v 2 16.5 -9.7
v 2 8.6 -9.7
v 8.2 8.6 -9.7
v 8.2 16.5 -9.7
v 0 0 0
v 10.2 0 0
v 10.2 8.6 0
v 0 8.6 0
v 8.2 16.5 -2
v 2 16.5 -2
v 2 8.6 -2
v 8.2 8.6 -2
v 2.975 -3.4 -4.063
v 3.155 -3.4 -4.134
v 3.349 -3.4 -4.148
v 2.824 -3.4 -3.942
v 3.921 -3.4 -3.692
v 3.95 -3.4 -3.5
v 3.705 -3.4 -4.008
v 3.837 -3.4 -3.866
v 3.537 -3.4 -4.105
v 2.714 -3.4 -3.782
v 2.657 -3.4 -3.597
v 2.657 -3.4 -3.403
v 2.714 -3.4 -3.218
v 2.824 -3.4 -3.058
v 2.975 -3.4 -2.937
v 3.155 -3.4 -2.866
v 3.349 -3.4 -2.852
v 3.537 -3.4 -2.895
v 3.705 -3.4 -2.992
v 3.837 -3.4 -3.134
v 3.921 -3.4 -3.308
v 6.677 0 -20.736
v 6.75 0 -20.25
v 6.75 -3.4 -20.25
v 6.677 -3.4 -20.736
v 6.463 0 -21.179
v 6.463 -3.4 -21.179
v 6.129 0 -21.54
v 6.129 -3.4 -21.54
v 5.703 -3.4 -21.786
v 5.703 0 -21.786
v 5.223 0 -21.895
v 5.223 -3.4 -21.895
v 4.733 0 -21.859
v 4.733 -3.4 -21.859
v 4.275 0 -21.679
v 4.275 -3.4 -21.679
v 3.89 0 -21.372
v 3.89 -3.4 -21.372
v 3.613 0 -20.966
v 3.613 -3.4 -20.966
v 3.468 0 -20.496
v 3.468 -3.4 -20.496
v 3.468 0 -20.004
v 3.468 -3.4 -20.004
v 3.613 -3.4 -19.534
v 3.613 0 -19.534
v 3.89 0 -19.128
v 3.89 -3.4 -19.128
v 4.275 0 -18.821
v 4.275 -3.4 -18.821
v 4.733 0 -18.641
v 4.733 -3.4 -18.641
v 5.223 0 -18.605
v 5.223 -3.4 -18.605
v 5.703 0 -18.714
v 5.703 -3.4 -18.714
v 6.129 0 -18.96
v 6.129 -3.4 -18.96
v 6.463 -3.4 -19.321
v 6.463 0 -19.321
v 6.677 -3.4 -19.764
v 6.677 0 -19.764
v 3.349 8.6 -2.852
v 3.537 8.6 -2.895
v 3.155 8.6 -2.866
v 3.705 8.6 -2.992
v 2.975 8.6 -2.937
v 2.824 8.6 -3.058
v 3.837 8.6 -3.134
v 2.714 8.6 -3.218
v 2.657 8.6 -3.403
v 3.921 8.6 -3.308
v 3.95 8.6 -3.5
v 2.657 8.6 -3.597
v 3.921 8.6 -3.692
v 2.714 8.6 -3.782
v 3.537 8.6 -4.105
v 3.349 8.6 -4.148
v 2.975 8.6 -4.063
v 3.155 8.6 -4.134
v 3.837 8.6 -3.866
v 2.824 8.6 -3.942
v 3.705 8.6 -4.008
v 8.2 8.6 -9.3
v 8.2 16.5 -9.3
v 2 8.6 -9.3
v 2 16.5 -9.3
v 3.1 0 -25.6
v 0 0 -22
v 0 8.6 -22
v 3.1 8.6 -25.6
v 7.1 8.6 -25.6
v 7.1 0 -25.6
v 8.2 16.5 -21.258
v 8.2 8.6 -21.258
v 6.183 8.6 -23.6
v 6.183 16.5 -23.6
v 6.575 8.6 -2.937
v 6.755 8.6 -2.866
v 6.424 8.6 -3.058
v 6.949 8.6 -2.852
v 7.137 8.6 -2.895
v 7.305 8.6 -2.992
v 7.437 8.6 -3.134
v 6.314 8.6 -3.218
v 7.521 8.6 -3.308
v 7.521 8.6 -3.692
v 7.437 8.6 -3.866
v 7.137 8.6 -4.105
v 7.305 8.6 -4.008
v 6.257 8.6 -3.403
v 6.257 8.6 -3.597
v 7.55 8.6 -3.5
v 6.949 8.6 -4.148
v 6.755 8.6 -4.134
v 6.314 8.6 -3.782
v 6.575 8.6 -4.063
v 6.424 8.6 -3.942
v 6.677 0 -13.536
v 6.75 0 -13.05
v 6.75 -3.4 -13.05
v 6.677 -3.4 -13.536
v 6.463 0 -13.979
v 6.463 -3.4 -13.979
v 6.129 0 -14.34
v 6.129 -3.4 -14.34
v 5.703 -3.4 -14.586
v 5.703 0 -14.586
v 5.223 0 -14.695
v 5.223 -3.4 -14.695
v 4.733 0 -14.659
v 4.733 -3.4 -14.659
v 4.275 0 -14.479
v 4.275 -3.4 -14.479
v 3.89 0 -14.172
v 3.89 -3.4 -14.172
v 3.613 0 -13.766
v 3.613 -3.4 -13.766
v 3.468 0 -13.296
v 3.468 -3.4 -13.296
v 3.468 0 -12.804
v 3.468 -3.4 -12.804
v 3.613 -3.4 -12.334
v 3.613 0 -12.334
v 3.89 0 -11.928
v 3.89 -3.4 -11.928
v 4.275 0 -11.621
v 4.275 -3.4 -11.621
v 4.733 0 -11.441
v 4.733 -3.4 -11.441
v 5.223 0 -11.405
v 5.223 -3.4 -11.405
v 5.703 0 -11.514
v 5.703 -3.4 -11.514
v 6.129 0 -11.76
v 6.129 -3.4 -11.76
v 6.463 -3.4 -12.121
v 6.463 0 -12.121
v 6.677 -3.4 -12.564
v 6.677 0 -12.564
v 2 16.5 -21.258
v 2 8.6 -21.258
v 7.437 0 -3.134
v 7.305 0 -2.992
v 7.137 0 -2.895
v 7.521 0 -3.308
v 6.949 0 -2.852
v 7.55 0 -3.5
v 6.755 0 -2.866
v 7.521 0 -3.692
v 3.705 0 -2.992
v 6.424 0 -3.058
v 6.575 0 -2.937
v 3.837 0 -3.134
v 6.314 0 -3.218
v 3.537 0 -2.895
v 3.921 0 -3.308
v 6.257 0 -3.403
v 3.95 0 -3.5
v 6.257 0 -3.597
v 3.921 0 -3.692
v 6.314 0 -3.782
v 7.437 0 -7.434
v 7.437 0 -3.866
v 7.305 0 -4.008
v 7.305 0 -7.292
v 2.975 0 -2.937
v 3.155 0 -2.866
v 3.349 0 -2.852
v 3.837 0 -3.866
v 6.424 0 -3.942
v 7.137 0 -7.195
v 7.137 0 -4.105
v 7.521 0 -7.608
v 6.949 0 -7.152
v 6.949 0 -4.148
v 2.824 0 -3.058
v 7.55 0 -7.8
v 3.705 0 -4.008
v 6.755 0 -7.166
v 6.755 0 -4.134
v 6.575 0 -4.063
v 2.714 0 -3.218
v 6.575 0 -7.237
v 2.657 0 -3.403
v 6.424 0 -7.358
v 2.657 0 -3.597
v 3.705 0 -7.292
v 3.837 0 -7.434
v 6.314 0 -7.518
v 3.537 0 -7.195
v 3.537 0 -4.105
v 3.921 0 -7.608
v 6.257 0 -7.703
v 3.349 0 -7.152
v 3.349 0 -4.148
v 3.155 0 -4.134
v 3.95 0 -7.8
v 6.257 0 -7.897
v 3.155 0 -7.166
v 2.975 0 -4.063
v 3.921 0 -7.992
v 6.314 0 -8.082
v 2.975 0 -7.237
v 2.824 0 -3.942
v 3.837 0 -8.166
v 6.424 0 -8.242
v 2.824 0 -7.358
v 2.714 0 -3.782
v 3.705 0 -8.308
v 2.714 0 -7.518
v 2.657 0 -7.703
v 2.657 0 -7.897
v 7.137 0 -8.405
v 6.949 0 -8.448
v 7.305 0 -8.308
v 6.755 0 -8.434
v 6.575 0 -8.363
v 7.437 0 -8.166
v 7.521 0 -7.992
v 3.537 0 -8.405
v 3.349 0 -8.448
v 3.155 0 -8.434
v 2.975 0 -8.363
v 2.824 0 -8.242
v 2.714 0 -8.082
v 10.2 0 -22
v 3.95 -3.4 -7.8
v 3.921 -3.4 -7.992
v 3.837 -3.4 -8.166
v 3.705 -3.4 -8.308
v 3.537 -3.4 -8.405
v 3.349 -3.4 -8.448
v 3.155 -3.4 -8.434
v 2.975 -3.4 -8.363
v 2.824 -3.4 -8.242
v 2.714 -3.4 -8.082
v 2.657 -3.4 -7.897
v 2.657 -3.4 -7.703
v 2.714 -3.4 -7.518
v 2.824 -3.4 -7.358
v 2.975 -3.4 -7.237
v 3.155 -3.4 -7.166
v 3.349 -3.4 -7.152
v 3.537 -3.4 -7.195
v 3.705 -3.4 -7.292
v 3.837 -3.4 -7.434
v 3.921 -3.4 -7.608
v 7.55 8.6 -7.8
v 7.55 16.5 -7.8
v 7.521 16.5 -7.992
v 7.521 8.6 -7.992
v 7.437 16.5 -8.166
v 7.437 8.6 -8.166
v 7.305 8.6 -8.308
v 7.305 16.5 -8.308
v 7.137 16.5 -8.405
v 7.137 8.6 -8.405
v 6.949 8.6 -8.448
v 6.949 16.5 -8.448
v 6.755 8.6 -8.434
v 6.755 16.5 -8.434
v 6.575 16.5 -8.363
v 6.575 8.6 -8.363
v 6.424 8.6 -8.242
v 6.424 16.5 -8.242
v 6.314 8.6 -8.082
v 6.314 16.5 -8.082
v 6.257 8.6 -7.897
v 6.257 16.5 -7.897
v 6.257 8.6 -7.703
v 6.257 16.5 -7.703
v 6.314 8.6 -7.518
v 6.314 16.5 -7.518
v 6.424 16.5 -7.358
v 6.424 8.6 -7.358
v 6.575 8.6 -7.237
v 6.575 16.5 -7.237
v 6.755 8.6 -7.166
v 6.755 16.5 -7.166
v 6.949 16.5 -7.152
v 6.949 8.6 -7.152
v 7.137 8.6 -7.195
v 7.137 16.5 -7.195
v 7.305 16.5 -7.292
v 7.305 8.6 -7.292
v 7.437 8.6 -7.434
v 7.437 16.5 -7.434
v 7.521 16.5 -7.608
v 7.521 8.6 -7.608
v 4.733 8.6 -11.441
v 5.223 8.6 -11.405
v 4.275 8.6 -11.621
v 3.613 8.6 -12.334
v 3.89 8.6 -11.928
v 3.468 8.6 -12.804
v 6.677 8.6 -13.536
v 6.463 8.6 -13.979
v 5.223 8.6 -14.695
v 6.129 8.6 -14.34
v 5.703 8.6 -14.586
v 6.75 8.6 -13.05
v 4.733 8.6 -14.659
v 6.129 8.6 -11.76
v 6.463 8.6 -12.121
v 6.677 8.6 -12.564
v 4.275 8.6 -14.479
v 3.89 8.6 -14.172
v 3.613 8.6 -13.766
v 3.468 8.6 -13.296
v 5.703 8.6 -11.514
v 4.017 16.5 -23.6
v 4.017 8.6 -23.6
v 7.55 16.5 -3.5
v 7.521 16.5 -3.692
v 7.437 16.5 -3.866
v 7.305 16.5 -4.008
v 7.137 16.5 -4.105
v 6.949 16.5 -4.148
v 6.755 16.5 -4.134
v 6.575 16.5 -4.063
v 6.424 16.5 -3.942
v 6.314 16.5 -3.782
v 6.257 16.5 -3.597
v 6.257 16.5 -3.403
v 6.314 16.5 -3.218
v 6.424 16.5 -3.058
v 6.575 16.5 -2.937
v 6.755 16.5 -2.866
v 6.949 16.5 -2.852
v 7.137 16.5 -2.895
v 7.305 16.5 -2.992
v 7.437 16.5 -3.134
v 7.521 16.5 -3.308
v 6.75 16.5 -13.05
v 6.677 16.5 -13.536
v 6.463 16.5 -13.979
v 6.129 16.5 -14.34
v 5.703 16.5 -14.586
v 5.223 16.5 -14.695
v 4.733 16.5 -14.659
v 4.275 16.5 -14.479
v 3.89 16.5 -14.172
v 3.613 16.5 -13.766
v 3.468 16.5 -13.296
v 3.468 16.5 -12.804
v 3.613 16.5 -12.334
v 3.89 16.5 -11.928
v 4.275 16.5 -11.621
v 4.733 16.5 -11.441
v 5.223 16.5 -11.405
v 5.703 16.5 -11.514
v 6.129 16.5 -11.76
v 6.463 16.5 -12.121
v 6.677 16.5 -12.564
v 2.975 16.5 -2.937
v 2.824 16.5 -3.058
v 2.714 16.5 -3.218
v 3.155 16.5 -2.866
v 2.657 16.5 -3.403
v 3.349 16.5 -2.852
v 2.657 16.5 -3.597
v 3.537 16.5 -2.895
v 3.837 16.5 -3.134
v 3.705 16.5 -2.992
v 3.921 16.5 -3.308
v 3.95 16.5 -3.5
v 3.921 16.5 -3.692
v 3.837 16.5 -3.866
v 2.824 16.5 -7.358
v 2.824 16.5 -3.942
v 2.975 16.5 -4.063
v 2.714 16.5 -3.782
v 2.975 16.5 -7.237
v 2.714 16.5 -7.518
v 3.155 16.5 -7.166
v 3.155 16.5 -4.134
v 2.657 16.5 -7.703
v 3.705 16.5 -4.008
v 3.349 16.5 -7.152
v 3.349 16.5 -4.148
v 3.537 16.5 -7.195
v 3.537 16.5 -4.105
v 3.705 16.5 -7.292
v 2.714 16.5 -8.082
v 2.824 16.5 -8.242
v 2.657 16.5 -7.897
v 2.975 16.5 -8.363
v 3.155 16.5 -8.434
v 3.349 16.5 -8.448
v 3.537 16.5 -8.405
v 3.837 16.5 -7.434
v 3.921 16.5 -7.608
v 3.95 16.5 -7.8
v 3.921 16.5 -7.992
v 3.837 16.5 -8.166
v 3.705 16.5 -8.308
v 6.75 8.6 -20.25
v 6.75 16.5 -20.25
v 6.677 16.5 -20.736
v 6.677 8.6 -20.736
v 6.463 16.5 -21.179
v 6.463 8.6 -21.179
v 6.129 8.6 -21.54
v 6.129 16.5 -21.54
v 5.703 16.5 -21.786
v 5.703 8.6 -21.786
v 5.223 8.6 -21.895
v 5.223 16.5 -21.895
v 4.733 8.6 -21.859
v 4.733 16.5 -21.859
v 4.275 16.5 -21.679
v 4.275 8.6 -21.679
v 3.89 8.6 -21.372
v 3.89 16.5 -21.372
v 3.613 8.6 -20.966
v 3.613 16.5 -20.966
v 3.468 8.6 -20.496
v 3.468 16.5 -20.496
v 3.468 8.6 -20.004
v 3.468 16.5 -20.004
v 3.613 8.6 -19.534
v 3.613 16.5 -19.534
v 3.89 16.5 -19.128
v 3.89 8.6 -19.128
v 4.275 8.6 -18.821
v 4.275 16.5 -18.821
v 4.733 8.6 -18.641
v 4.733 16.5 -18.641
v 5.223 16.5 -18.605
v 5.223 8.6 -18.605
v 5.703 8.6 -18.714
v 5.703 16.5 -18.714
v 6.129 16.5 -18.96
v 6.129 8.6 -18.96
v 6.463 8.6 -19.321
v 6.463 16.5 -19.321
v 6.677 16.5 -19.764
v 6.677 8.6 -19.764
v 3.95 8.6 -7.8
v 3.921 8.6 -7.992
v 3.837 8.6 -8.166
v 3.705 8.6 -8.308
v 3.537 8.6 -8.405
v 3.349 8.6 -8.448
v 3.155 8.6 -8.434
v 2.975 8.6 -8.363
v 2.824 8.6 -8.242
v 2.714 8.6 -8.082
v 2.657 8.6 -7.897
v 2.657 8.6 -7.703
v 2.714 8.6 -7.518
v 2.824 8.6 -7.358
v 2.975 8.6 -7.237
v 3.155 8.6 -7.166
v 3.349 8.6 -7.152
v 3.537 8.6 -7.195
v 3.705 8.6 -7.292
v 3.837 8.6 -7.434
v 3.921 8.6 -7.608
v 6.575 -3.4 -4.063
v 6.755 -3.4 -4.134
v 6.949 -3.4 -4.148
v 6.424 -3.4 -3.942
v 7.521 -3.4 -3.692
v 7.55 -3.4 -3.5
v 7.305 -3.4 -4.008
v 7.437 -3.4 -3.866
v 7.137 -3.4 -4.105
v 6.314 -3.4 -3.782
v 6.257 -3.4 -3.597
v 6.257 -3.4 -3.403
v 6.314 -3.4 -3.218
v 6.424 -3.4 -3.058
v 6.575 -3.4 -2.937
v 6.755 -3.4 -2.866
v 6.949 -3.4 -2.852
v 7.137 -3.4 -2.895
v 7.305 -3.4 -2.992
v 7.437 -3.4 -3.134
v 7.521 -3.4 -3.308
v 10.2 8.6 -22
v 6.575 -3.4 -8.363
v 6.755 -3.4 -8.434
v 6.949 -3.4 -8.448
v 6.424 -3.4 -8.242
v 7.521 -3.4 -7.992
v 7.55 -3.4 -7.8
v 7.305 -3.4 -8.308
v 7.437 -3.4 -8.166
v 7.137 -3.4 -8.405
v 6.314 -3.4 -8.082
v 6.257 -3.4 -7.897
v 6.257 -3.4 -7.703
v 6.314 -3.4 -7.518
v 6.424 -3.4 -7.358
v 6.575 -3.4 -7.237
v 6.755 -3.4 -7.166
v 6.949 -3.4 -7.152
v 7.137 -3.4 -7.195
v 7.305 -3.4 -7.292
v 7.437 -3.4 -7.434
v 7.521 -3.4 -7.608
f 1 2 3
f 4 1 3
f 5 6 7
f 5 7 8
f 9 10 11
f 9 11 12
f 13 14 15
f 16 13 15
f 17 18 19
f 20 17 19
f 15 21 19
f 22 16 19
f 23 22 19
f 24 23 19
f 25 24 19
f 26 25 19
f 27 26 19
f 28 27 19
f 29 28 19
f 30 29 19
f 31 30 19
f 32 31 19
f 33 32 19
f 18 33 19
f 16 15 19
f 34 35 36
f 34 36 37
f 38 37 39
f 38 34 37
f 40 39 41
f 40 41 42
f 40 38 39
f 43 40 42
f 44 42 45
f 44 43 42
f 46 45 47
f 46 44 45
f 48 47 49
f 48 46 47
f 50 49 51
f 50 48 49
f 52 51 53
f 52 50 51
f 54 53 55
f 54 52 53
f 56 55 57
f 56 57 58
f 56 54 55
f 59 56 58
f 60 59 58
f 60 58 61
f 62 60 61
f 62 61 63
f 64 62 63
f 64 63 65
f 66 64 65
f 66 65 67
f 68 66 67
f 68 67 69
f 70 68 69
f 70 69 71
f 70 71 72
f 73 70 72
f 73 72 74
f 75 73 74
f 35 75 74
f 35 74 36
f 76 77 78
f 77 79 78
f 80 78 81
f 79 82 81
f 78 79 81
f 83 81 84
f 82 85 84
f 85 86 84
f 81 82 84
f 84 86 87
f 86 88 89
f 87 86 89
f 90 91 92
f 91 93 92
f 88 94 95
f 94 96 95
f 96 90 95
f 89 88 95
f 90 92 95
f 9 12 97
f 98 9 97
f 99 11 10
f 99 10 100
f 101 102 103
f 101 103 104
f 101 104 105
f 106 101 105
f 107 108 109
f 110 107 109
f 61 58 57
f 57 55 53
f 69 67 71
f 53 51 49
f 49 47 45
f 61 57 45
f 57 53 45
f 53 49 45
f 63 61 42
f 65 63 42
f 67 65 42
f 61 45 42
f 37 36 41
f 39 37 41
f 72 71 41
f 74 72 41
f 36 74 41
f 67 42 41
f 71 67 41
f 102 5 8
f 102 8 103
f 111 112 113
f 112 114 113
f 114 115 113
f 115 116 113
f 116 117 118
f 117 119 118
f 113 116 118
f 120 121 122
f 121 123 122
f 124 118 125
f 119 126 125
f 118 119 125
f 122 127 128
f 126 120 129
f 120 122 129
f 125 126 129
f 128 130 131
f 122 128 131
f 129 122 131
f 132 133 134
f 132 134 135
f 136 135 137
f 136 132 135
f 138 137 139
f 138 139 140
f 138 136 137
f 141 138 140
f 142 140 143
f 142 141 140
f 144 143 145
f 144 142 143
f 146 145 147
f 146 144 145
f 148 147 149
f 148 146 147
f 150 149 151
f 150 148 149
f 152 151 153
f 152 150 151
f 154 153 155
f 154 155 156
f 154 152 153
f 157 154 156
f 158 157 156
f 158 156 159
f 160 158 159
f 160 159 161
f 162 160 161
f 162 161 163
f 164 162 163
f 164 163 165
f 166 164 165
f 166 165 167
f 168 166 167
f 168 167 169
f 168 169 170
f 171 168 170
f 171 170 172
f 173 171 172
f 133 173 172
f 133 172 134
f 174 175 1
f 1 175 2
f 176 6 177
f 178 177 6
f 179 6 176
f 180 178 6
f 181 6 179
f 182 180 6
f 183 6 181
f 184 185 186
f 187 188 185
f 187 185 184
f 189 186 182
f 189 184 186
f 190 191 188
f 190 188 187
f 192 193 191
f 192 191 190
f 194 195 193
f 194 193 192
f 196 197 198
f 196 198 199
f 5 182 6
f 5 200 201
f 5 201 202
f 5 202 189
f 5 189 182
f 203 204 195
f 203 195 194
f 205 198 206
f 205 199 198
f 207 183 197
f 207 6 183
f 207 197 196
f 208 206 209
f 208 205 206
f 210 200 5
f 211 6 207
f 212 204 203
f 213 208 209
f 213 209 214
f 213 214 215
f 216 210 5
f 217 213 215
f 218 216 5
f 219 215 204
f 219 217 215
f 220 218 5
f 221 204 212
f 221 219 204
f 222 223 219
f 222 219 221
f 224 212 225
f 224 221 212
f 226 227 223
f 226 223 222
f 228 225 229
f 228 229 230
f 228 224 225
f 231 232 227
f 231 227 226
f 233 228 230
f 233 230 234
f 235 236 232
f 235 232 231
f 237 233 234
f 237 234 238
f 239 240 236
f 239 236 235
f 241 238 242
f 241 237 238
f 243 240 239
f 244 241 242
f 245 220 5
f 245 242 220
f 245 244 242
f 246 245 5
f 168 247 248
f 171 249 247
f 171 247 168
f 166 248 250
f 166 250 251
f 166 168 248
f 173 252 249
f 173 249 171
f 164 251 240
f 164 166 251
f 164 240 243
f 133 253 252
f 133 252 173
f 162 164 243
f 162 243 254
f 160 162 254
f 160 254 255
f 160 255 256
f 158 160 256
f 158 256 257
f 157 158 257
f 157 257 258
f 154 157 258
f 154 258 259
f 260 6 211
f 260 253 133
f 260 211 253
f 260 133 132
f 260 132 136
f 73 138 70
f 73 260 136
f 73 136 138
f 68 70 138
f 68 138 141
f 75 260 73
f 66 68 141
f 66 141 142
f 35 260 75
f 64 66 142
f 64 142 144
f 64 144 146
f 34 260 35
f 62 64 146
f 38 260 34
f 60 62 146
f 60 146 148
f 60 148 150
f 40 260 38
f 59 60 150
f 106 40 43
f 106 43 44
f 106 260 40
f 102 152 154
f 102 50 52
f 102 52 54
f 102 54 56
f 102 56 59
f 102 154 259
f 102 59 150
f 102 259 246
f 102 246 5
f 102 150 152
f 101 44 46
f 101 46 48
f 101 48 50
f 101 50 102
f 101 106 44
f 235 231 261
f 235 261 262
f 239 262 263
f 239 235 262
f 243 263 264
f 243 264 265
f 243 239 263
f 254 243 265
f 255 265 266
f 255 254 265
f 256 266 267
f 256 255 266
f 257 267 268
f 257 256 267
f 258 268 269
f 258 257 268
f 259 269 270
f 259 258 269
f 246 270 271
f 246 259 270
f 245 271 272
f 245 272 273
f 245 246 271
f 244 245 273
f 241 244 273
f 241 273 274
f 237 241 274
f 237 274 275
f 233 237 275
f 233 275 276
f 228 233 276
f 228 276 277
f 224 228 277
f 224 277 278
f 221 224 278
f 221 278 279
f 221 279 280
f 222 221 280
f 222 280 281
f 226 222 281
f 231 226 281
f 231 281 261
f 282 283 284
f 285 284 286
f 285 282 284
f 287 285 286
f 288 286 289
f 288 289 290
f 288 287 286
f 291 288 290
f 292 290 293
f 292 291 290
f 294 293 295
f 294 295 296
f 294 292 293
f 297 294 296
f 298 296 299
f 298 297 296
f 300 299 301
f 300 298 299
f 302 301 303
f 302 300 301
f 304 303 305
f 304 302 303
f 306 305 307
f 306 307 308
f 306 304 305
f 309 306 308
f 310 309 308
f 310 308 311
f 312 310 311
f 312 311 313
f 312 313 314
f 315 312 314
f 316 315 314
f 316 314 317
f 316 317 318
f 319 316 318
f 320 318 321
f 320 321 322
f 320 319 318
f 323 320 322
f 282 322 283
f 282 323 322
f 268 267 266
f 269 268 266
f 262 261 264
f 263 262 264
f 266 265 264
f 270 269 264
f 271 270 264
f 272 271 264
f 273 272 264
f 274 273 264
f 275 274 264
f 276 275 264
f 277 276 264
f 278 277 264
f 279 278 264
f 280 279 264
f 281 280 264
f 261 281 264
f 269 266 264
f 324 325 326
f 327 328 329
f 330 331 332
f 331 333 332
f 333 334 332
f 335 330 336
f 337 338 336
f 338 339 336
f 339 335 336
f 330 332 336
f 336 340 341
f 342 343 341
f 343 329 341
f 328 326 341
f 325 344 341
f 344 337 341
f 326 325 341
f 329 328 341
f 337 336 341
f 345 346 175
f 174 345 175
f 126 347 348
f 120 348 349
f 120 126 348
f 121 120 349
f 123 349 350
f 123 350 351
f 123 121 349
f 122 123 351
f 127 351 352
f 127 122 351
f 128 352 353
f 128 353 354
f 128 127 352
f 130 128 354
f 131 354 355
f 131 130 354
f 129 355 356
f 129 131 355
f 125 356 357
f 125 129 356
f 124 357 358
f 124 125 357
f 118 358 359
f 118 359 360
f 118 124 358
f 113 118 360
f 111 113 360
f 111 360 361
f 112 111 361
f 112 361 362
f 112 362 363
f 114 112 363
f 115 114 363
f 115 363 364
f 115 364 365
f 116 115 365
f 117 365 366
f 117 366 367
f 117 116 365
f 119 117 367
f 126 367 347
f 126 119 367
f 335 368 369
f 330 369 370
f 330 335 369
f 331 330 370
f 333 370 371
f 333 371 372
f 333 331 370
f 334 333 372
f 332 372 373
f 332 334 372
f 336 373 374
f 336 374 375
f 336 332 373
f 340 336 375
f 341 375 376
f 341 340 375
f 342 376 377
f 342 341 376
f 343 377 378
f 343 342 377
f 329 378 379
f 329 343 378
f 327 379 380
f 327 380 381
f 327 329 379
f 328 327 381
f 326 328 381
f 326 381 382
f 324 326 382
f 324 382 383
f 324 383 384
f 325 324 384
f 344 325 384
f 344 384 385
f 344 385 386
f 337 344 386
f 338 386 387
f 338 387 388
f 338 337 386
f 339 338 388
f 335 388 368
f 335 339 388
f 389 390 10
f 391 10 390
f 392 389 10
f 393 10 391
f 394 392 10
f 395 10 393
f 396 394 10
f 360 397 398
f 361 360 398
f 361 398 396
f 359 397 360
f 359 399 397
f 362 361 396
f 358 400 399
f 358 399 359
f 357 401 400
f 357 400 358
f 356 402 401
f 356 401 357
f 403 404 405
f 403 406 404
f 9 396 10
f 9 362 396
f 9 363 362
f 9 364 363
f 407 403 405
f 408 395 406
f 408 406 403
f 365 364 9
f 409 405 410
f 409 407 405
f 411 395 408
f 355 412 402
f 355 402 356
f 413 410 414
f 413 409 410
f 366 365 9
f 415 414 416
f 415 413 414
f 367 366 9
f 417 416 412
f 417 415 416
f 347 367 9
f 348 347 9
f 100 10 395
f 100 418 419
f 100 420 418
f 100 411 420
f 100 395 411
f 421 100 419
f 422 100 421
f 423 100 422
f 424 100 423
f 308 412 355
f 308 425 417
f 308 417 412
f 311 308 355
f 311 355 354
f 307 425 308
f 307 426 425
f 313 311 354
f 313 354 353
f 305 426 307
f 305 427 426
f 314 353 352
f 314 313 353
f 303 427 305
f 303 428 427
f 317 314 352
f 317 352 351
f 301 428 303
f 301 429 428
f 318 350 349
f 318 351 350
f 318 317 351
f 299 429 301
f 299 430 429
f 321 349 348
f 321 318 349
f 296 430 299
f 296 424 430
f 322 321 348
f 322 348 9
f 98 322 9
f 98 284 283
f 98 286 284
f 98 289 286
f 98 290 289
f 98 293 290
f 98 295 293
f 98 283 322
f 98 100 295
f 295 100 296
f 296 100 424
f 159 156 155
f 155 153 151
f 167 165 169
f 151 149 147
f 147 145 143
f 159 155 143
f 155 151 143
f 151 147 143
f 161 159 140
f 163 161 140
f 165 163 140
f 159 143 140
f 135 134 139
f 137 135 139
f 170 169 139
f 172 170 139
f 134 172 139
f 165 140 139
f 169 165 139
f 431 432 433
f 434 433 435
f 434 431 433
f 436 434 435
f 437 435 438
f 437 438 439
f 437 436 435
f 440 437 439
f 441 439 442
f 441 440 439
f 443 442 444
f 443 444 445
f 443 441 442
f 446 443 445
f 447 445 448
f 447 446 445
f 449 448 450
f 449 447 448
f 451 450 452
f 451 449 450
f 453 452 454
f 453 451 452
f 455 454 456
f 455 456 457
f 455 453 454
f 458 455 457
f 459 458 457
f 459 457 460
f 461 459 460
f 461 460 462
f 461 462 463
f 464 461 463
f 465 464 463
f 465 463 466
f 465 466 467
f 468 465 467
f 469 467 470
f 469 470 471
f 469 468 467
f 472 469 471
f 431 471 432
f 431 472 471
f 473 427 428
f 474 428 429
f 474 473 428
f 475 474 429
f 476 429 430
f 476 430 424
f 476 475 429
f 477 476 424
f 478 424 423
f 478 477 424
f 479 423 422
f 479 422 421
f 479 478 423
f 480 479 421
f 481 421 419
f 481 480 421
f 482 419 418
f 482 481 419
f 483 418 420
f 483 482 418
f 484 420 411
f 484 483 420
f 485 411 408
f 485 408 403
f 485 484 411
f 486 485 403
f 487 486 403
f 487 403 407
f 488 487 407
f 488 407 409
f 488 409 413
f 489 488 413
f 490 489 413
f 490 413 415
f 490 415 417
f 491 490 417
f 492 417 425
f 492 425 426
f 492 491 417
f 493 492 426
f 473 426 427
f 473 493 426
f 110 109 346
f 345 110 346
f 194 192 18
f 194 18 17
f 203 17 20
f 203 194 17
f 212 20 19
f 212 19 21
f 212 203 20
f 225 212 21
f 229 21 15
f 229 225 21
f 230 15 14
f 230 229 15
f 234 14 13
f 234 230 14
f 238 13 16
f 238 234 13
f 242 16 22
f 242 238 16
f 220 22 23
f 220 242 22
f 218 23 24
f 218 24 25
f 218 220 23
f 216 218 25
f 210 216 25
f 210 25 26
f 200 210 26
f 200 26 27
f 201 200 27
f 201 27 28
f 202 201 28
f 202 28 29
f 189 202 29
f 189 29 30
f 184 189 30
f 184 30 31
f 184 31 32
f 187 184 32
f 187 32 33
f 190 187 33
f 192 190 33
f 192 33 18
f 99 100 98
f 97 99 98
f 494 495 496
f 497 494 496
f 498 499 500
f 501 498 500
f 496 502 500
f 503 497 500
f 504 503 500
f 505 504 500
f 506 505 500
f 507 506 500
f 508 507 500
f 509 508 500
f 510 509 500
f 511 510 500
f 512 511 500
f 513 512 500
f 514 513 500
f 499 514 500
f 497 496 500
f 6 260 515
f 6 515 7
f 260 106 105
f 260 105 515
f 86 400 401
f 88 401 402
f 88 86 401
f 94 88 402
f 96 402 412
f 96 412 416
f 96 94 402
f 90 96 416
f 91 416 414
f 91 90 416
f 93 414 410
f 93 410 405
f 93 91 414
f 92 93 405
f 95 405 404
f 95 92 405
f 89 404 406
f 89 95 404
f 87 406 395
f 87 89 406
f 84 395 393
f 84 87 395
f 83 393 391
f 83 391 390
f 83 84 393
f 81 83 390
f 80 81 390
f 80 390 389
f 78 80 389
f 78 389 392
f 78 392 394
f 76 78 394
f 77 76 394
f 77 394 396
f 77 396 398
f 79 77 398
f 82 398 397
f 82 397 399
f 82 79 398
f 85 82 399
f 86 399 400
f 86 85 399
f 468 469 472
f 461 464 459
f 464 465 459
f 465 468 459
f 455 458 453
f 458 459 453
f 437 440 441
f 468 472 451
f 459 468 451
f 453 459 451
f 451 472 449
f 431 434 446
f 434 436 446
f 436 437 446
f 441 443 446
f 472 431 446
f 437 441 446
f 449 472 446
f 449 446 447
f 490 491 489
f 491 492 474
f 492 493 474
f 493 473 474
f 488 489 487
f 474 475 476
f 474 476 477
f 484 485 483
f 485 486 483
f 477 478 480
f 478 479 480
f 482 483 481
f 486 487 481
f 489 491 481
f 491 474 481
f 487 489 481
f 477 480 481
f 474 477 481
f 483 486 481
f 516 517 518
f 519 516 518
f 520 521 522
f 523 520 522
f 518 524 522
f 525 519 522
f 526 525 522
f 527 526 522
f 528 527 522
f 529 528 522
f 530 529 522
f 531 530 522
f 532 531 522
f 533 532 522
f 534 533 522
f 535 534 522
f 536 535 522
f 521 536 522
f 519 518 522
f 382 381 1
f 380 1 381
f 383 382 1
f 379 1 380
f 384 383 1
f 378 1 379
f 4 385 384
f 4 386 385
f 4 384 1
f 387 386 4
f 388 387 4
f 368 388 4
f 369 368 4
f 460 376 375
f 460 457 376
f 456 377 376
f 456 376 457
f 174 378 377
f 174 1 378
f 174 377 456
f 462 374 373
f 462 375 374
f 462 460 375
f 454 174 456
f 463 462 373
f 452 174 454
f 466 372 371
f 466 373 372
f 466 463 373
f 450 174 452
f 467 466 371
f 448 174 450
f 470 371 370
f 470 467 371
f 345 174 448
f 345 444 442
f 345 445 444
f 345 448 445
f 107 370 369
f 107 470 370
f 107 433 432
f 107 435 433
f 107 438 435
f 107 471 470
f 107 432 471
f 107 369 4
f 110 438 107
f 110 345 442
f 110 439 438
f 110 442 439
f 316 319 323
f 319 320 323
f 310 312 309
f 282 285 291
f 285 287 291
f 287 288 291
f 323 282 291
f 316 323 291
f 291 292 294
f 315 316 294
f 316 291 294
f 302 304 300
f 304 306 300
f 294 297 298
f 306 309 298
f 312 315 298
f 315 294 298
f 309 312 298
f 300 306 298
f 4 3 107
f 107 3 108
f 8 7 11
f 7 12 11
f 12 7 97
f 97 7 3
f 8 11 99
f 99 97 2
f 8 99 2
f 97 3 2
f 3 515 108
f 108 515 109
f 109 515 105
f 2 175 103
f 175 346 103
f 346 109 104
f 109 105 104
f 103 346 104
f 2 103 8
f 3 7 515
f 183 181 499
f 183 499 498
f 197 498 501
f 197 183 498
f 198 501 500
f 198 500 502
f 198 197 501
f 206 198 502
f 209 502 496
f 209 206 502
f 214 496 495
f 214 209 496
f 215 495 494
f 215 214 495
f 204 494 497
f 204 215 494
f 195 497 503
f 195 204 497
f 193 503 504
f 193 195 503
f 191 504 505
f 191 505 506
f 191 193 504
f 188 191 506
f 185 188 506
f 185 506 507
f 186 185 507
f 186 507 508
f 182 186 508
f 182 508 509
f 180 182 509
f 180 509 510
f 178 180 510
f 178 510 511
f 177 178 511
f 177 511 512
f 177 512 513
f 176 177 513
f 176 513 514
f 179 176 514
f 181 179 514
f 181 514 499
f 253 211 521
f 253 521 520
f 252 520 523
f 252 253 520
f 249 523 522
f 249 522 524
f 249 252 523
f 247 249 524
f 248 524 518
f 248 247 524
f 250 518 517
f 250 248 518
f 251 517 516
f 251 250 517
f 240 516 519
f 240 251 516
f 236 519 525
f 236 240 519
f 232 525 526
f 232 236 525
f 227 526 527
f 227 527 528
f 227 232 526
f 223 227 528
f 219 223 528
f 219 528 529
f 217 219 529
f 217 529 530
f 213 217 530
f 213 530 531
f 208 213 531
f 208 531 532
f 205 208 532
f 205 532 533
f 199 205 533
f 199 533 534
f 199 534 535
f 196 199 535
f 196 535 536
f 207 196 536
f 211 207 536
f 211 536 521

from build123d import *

# Parameters (mm, degrees)
EXTRUDE_1_DEPTH = 8.6
SKETCH_2_R      = 1.65
SKETCH_2_W      = 6.2
SKETCH_2_H      = 7.3
SKETCH_2_R_2    = 0.65
EXTRUDE_2_DEPTH = 7.9
SKETCH_3_R      = 1.65
SKETCH_3_R_2    = 0.65
EXTRUDE_3_DEPTH = 12


with BuildPart() as part:
    # 草图1 → 凸台-拉伸1 (new body)
    with BuildSketch(Plane(origin=(0, 0, 0), x_dir=(1, 0, 0), z_dir=(0, 1, 0))):
        Polygon((0, 0), (0, 22), (3.1, 25.6), (7.1, 25.6), (10.2, 22), (10.2, 0), align=None)
    extrude(amount=EXTRUDE_1_DEPTH)

    # 草图2 → 凸台-拉伸2 (add)
    with BuildSketch(Plane(origin=(0, 8.6, 0), x_dir=(1, 0, 0), z_dir=(0, 1, 0))):
        Polygon((2, 9.7), (8.2, 9.7), (8.2, 21.257555221), (6.182894773, 23.6), (4.017105227, 23.6), (2, 21.257555221), align=None)
        with Locations((5.1, 20.25)):
            Circle(SKETCH_2_R, mode=Mode.SUBTRACT)
        with Locations((5.1, 13.05)):
            Circle(SKETCH_2_R, mode=Mode.SUBTRACT)
        with Locations((5.1, 5.65)):
            Rectangle(SKETCH_2_W, SKETCH_2_H)
        with Locations((3.3, 7.8)):
            Circle(SKETCH_2_R_2, mode=Mode.SUBTRACT)
        with Locations((6.9, 7.8)):
            Circle(SKETCH_2_R_2, mode=Mode.SUBTRACT)
        with Locations((6.9, 3.5)):
            Circle(SKETCH_2_R_2, mode=Mode.SUBTRACT)
        with Locations((3.3, 3.5)):
            Circle(SKETCH_2_R_2, mode=Mode.SUBTRACT)
    extrude(amount=EXTRUDE_2_DEPTH)

    # 草图3 → 凸台-拉伸3 (add)
    with BuildSketch(Plane(origin=(0, 8.6, 0), x_dir=(1, 0, 0), z_dir=(0, 1, 0))):
        with Locations((5.1, 20.25)):
            Circle(SKETCH_3_R)
        with Locations((5.1, 13.05)):
            Circle(SKETCH_3_R)
        with Locations((3.3, 7.8)):
            Circle(SKETCH_3_R_2)
        with Locations((6.9, 7.8)):
            Circle(SKETCH_3_R_2)
        with Locations((6.9, 3.5)):
            Circle(SKETCH_3_R_2)
        with Locations((3.3, 3.5)):
            Circle(SKETCH_3_R_2)
    extrude(amount=-EXTRUDE_3_DEPTH)


solid = part.part
